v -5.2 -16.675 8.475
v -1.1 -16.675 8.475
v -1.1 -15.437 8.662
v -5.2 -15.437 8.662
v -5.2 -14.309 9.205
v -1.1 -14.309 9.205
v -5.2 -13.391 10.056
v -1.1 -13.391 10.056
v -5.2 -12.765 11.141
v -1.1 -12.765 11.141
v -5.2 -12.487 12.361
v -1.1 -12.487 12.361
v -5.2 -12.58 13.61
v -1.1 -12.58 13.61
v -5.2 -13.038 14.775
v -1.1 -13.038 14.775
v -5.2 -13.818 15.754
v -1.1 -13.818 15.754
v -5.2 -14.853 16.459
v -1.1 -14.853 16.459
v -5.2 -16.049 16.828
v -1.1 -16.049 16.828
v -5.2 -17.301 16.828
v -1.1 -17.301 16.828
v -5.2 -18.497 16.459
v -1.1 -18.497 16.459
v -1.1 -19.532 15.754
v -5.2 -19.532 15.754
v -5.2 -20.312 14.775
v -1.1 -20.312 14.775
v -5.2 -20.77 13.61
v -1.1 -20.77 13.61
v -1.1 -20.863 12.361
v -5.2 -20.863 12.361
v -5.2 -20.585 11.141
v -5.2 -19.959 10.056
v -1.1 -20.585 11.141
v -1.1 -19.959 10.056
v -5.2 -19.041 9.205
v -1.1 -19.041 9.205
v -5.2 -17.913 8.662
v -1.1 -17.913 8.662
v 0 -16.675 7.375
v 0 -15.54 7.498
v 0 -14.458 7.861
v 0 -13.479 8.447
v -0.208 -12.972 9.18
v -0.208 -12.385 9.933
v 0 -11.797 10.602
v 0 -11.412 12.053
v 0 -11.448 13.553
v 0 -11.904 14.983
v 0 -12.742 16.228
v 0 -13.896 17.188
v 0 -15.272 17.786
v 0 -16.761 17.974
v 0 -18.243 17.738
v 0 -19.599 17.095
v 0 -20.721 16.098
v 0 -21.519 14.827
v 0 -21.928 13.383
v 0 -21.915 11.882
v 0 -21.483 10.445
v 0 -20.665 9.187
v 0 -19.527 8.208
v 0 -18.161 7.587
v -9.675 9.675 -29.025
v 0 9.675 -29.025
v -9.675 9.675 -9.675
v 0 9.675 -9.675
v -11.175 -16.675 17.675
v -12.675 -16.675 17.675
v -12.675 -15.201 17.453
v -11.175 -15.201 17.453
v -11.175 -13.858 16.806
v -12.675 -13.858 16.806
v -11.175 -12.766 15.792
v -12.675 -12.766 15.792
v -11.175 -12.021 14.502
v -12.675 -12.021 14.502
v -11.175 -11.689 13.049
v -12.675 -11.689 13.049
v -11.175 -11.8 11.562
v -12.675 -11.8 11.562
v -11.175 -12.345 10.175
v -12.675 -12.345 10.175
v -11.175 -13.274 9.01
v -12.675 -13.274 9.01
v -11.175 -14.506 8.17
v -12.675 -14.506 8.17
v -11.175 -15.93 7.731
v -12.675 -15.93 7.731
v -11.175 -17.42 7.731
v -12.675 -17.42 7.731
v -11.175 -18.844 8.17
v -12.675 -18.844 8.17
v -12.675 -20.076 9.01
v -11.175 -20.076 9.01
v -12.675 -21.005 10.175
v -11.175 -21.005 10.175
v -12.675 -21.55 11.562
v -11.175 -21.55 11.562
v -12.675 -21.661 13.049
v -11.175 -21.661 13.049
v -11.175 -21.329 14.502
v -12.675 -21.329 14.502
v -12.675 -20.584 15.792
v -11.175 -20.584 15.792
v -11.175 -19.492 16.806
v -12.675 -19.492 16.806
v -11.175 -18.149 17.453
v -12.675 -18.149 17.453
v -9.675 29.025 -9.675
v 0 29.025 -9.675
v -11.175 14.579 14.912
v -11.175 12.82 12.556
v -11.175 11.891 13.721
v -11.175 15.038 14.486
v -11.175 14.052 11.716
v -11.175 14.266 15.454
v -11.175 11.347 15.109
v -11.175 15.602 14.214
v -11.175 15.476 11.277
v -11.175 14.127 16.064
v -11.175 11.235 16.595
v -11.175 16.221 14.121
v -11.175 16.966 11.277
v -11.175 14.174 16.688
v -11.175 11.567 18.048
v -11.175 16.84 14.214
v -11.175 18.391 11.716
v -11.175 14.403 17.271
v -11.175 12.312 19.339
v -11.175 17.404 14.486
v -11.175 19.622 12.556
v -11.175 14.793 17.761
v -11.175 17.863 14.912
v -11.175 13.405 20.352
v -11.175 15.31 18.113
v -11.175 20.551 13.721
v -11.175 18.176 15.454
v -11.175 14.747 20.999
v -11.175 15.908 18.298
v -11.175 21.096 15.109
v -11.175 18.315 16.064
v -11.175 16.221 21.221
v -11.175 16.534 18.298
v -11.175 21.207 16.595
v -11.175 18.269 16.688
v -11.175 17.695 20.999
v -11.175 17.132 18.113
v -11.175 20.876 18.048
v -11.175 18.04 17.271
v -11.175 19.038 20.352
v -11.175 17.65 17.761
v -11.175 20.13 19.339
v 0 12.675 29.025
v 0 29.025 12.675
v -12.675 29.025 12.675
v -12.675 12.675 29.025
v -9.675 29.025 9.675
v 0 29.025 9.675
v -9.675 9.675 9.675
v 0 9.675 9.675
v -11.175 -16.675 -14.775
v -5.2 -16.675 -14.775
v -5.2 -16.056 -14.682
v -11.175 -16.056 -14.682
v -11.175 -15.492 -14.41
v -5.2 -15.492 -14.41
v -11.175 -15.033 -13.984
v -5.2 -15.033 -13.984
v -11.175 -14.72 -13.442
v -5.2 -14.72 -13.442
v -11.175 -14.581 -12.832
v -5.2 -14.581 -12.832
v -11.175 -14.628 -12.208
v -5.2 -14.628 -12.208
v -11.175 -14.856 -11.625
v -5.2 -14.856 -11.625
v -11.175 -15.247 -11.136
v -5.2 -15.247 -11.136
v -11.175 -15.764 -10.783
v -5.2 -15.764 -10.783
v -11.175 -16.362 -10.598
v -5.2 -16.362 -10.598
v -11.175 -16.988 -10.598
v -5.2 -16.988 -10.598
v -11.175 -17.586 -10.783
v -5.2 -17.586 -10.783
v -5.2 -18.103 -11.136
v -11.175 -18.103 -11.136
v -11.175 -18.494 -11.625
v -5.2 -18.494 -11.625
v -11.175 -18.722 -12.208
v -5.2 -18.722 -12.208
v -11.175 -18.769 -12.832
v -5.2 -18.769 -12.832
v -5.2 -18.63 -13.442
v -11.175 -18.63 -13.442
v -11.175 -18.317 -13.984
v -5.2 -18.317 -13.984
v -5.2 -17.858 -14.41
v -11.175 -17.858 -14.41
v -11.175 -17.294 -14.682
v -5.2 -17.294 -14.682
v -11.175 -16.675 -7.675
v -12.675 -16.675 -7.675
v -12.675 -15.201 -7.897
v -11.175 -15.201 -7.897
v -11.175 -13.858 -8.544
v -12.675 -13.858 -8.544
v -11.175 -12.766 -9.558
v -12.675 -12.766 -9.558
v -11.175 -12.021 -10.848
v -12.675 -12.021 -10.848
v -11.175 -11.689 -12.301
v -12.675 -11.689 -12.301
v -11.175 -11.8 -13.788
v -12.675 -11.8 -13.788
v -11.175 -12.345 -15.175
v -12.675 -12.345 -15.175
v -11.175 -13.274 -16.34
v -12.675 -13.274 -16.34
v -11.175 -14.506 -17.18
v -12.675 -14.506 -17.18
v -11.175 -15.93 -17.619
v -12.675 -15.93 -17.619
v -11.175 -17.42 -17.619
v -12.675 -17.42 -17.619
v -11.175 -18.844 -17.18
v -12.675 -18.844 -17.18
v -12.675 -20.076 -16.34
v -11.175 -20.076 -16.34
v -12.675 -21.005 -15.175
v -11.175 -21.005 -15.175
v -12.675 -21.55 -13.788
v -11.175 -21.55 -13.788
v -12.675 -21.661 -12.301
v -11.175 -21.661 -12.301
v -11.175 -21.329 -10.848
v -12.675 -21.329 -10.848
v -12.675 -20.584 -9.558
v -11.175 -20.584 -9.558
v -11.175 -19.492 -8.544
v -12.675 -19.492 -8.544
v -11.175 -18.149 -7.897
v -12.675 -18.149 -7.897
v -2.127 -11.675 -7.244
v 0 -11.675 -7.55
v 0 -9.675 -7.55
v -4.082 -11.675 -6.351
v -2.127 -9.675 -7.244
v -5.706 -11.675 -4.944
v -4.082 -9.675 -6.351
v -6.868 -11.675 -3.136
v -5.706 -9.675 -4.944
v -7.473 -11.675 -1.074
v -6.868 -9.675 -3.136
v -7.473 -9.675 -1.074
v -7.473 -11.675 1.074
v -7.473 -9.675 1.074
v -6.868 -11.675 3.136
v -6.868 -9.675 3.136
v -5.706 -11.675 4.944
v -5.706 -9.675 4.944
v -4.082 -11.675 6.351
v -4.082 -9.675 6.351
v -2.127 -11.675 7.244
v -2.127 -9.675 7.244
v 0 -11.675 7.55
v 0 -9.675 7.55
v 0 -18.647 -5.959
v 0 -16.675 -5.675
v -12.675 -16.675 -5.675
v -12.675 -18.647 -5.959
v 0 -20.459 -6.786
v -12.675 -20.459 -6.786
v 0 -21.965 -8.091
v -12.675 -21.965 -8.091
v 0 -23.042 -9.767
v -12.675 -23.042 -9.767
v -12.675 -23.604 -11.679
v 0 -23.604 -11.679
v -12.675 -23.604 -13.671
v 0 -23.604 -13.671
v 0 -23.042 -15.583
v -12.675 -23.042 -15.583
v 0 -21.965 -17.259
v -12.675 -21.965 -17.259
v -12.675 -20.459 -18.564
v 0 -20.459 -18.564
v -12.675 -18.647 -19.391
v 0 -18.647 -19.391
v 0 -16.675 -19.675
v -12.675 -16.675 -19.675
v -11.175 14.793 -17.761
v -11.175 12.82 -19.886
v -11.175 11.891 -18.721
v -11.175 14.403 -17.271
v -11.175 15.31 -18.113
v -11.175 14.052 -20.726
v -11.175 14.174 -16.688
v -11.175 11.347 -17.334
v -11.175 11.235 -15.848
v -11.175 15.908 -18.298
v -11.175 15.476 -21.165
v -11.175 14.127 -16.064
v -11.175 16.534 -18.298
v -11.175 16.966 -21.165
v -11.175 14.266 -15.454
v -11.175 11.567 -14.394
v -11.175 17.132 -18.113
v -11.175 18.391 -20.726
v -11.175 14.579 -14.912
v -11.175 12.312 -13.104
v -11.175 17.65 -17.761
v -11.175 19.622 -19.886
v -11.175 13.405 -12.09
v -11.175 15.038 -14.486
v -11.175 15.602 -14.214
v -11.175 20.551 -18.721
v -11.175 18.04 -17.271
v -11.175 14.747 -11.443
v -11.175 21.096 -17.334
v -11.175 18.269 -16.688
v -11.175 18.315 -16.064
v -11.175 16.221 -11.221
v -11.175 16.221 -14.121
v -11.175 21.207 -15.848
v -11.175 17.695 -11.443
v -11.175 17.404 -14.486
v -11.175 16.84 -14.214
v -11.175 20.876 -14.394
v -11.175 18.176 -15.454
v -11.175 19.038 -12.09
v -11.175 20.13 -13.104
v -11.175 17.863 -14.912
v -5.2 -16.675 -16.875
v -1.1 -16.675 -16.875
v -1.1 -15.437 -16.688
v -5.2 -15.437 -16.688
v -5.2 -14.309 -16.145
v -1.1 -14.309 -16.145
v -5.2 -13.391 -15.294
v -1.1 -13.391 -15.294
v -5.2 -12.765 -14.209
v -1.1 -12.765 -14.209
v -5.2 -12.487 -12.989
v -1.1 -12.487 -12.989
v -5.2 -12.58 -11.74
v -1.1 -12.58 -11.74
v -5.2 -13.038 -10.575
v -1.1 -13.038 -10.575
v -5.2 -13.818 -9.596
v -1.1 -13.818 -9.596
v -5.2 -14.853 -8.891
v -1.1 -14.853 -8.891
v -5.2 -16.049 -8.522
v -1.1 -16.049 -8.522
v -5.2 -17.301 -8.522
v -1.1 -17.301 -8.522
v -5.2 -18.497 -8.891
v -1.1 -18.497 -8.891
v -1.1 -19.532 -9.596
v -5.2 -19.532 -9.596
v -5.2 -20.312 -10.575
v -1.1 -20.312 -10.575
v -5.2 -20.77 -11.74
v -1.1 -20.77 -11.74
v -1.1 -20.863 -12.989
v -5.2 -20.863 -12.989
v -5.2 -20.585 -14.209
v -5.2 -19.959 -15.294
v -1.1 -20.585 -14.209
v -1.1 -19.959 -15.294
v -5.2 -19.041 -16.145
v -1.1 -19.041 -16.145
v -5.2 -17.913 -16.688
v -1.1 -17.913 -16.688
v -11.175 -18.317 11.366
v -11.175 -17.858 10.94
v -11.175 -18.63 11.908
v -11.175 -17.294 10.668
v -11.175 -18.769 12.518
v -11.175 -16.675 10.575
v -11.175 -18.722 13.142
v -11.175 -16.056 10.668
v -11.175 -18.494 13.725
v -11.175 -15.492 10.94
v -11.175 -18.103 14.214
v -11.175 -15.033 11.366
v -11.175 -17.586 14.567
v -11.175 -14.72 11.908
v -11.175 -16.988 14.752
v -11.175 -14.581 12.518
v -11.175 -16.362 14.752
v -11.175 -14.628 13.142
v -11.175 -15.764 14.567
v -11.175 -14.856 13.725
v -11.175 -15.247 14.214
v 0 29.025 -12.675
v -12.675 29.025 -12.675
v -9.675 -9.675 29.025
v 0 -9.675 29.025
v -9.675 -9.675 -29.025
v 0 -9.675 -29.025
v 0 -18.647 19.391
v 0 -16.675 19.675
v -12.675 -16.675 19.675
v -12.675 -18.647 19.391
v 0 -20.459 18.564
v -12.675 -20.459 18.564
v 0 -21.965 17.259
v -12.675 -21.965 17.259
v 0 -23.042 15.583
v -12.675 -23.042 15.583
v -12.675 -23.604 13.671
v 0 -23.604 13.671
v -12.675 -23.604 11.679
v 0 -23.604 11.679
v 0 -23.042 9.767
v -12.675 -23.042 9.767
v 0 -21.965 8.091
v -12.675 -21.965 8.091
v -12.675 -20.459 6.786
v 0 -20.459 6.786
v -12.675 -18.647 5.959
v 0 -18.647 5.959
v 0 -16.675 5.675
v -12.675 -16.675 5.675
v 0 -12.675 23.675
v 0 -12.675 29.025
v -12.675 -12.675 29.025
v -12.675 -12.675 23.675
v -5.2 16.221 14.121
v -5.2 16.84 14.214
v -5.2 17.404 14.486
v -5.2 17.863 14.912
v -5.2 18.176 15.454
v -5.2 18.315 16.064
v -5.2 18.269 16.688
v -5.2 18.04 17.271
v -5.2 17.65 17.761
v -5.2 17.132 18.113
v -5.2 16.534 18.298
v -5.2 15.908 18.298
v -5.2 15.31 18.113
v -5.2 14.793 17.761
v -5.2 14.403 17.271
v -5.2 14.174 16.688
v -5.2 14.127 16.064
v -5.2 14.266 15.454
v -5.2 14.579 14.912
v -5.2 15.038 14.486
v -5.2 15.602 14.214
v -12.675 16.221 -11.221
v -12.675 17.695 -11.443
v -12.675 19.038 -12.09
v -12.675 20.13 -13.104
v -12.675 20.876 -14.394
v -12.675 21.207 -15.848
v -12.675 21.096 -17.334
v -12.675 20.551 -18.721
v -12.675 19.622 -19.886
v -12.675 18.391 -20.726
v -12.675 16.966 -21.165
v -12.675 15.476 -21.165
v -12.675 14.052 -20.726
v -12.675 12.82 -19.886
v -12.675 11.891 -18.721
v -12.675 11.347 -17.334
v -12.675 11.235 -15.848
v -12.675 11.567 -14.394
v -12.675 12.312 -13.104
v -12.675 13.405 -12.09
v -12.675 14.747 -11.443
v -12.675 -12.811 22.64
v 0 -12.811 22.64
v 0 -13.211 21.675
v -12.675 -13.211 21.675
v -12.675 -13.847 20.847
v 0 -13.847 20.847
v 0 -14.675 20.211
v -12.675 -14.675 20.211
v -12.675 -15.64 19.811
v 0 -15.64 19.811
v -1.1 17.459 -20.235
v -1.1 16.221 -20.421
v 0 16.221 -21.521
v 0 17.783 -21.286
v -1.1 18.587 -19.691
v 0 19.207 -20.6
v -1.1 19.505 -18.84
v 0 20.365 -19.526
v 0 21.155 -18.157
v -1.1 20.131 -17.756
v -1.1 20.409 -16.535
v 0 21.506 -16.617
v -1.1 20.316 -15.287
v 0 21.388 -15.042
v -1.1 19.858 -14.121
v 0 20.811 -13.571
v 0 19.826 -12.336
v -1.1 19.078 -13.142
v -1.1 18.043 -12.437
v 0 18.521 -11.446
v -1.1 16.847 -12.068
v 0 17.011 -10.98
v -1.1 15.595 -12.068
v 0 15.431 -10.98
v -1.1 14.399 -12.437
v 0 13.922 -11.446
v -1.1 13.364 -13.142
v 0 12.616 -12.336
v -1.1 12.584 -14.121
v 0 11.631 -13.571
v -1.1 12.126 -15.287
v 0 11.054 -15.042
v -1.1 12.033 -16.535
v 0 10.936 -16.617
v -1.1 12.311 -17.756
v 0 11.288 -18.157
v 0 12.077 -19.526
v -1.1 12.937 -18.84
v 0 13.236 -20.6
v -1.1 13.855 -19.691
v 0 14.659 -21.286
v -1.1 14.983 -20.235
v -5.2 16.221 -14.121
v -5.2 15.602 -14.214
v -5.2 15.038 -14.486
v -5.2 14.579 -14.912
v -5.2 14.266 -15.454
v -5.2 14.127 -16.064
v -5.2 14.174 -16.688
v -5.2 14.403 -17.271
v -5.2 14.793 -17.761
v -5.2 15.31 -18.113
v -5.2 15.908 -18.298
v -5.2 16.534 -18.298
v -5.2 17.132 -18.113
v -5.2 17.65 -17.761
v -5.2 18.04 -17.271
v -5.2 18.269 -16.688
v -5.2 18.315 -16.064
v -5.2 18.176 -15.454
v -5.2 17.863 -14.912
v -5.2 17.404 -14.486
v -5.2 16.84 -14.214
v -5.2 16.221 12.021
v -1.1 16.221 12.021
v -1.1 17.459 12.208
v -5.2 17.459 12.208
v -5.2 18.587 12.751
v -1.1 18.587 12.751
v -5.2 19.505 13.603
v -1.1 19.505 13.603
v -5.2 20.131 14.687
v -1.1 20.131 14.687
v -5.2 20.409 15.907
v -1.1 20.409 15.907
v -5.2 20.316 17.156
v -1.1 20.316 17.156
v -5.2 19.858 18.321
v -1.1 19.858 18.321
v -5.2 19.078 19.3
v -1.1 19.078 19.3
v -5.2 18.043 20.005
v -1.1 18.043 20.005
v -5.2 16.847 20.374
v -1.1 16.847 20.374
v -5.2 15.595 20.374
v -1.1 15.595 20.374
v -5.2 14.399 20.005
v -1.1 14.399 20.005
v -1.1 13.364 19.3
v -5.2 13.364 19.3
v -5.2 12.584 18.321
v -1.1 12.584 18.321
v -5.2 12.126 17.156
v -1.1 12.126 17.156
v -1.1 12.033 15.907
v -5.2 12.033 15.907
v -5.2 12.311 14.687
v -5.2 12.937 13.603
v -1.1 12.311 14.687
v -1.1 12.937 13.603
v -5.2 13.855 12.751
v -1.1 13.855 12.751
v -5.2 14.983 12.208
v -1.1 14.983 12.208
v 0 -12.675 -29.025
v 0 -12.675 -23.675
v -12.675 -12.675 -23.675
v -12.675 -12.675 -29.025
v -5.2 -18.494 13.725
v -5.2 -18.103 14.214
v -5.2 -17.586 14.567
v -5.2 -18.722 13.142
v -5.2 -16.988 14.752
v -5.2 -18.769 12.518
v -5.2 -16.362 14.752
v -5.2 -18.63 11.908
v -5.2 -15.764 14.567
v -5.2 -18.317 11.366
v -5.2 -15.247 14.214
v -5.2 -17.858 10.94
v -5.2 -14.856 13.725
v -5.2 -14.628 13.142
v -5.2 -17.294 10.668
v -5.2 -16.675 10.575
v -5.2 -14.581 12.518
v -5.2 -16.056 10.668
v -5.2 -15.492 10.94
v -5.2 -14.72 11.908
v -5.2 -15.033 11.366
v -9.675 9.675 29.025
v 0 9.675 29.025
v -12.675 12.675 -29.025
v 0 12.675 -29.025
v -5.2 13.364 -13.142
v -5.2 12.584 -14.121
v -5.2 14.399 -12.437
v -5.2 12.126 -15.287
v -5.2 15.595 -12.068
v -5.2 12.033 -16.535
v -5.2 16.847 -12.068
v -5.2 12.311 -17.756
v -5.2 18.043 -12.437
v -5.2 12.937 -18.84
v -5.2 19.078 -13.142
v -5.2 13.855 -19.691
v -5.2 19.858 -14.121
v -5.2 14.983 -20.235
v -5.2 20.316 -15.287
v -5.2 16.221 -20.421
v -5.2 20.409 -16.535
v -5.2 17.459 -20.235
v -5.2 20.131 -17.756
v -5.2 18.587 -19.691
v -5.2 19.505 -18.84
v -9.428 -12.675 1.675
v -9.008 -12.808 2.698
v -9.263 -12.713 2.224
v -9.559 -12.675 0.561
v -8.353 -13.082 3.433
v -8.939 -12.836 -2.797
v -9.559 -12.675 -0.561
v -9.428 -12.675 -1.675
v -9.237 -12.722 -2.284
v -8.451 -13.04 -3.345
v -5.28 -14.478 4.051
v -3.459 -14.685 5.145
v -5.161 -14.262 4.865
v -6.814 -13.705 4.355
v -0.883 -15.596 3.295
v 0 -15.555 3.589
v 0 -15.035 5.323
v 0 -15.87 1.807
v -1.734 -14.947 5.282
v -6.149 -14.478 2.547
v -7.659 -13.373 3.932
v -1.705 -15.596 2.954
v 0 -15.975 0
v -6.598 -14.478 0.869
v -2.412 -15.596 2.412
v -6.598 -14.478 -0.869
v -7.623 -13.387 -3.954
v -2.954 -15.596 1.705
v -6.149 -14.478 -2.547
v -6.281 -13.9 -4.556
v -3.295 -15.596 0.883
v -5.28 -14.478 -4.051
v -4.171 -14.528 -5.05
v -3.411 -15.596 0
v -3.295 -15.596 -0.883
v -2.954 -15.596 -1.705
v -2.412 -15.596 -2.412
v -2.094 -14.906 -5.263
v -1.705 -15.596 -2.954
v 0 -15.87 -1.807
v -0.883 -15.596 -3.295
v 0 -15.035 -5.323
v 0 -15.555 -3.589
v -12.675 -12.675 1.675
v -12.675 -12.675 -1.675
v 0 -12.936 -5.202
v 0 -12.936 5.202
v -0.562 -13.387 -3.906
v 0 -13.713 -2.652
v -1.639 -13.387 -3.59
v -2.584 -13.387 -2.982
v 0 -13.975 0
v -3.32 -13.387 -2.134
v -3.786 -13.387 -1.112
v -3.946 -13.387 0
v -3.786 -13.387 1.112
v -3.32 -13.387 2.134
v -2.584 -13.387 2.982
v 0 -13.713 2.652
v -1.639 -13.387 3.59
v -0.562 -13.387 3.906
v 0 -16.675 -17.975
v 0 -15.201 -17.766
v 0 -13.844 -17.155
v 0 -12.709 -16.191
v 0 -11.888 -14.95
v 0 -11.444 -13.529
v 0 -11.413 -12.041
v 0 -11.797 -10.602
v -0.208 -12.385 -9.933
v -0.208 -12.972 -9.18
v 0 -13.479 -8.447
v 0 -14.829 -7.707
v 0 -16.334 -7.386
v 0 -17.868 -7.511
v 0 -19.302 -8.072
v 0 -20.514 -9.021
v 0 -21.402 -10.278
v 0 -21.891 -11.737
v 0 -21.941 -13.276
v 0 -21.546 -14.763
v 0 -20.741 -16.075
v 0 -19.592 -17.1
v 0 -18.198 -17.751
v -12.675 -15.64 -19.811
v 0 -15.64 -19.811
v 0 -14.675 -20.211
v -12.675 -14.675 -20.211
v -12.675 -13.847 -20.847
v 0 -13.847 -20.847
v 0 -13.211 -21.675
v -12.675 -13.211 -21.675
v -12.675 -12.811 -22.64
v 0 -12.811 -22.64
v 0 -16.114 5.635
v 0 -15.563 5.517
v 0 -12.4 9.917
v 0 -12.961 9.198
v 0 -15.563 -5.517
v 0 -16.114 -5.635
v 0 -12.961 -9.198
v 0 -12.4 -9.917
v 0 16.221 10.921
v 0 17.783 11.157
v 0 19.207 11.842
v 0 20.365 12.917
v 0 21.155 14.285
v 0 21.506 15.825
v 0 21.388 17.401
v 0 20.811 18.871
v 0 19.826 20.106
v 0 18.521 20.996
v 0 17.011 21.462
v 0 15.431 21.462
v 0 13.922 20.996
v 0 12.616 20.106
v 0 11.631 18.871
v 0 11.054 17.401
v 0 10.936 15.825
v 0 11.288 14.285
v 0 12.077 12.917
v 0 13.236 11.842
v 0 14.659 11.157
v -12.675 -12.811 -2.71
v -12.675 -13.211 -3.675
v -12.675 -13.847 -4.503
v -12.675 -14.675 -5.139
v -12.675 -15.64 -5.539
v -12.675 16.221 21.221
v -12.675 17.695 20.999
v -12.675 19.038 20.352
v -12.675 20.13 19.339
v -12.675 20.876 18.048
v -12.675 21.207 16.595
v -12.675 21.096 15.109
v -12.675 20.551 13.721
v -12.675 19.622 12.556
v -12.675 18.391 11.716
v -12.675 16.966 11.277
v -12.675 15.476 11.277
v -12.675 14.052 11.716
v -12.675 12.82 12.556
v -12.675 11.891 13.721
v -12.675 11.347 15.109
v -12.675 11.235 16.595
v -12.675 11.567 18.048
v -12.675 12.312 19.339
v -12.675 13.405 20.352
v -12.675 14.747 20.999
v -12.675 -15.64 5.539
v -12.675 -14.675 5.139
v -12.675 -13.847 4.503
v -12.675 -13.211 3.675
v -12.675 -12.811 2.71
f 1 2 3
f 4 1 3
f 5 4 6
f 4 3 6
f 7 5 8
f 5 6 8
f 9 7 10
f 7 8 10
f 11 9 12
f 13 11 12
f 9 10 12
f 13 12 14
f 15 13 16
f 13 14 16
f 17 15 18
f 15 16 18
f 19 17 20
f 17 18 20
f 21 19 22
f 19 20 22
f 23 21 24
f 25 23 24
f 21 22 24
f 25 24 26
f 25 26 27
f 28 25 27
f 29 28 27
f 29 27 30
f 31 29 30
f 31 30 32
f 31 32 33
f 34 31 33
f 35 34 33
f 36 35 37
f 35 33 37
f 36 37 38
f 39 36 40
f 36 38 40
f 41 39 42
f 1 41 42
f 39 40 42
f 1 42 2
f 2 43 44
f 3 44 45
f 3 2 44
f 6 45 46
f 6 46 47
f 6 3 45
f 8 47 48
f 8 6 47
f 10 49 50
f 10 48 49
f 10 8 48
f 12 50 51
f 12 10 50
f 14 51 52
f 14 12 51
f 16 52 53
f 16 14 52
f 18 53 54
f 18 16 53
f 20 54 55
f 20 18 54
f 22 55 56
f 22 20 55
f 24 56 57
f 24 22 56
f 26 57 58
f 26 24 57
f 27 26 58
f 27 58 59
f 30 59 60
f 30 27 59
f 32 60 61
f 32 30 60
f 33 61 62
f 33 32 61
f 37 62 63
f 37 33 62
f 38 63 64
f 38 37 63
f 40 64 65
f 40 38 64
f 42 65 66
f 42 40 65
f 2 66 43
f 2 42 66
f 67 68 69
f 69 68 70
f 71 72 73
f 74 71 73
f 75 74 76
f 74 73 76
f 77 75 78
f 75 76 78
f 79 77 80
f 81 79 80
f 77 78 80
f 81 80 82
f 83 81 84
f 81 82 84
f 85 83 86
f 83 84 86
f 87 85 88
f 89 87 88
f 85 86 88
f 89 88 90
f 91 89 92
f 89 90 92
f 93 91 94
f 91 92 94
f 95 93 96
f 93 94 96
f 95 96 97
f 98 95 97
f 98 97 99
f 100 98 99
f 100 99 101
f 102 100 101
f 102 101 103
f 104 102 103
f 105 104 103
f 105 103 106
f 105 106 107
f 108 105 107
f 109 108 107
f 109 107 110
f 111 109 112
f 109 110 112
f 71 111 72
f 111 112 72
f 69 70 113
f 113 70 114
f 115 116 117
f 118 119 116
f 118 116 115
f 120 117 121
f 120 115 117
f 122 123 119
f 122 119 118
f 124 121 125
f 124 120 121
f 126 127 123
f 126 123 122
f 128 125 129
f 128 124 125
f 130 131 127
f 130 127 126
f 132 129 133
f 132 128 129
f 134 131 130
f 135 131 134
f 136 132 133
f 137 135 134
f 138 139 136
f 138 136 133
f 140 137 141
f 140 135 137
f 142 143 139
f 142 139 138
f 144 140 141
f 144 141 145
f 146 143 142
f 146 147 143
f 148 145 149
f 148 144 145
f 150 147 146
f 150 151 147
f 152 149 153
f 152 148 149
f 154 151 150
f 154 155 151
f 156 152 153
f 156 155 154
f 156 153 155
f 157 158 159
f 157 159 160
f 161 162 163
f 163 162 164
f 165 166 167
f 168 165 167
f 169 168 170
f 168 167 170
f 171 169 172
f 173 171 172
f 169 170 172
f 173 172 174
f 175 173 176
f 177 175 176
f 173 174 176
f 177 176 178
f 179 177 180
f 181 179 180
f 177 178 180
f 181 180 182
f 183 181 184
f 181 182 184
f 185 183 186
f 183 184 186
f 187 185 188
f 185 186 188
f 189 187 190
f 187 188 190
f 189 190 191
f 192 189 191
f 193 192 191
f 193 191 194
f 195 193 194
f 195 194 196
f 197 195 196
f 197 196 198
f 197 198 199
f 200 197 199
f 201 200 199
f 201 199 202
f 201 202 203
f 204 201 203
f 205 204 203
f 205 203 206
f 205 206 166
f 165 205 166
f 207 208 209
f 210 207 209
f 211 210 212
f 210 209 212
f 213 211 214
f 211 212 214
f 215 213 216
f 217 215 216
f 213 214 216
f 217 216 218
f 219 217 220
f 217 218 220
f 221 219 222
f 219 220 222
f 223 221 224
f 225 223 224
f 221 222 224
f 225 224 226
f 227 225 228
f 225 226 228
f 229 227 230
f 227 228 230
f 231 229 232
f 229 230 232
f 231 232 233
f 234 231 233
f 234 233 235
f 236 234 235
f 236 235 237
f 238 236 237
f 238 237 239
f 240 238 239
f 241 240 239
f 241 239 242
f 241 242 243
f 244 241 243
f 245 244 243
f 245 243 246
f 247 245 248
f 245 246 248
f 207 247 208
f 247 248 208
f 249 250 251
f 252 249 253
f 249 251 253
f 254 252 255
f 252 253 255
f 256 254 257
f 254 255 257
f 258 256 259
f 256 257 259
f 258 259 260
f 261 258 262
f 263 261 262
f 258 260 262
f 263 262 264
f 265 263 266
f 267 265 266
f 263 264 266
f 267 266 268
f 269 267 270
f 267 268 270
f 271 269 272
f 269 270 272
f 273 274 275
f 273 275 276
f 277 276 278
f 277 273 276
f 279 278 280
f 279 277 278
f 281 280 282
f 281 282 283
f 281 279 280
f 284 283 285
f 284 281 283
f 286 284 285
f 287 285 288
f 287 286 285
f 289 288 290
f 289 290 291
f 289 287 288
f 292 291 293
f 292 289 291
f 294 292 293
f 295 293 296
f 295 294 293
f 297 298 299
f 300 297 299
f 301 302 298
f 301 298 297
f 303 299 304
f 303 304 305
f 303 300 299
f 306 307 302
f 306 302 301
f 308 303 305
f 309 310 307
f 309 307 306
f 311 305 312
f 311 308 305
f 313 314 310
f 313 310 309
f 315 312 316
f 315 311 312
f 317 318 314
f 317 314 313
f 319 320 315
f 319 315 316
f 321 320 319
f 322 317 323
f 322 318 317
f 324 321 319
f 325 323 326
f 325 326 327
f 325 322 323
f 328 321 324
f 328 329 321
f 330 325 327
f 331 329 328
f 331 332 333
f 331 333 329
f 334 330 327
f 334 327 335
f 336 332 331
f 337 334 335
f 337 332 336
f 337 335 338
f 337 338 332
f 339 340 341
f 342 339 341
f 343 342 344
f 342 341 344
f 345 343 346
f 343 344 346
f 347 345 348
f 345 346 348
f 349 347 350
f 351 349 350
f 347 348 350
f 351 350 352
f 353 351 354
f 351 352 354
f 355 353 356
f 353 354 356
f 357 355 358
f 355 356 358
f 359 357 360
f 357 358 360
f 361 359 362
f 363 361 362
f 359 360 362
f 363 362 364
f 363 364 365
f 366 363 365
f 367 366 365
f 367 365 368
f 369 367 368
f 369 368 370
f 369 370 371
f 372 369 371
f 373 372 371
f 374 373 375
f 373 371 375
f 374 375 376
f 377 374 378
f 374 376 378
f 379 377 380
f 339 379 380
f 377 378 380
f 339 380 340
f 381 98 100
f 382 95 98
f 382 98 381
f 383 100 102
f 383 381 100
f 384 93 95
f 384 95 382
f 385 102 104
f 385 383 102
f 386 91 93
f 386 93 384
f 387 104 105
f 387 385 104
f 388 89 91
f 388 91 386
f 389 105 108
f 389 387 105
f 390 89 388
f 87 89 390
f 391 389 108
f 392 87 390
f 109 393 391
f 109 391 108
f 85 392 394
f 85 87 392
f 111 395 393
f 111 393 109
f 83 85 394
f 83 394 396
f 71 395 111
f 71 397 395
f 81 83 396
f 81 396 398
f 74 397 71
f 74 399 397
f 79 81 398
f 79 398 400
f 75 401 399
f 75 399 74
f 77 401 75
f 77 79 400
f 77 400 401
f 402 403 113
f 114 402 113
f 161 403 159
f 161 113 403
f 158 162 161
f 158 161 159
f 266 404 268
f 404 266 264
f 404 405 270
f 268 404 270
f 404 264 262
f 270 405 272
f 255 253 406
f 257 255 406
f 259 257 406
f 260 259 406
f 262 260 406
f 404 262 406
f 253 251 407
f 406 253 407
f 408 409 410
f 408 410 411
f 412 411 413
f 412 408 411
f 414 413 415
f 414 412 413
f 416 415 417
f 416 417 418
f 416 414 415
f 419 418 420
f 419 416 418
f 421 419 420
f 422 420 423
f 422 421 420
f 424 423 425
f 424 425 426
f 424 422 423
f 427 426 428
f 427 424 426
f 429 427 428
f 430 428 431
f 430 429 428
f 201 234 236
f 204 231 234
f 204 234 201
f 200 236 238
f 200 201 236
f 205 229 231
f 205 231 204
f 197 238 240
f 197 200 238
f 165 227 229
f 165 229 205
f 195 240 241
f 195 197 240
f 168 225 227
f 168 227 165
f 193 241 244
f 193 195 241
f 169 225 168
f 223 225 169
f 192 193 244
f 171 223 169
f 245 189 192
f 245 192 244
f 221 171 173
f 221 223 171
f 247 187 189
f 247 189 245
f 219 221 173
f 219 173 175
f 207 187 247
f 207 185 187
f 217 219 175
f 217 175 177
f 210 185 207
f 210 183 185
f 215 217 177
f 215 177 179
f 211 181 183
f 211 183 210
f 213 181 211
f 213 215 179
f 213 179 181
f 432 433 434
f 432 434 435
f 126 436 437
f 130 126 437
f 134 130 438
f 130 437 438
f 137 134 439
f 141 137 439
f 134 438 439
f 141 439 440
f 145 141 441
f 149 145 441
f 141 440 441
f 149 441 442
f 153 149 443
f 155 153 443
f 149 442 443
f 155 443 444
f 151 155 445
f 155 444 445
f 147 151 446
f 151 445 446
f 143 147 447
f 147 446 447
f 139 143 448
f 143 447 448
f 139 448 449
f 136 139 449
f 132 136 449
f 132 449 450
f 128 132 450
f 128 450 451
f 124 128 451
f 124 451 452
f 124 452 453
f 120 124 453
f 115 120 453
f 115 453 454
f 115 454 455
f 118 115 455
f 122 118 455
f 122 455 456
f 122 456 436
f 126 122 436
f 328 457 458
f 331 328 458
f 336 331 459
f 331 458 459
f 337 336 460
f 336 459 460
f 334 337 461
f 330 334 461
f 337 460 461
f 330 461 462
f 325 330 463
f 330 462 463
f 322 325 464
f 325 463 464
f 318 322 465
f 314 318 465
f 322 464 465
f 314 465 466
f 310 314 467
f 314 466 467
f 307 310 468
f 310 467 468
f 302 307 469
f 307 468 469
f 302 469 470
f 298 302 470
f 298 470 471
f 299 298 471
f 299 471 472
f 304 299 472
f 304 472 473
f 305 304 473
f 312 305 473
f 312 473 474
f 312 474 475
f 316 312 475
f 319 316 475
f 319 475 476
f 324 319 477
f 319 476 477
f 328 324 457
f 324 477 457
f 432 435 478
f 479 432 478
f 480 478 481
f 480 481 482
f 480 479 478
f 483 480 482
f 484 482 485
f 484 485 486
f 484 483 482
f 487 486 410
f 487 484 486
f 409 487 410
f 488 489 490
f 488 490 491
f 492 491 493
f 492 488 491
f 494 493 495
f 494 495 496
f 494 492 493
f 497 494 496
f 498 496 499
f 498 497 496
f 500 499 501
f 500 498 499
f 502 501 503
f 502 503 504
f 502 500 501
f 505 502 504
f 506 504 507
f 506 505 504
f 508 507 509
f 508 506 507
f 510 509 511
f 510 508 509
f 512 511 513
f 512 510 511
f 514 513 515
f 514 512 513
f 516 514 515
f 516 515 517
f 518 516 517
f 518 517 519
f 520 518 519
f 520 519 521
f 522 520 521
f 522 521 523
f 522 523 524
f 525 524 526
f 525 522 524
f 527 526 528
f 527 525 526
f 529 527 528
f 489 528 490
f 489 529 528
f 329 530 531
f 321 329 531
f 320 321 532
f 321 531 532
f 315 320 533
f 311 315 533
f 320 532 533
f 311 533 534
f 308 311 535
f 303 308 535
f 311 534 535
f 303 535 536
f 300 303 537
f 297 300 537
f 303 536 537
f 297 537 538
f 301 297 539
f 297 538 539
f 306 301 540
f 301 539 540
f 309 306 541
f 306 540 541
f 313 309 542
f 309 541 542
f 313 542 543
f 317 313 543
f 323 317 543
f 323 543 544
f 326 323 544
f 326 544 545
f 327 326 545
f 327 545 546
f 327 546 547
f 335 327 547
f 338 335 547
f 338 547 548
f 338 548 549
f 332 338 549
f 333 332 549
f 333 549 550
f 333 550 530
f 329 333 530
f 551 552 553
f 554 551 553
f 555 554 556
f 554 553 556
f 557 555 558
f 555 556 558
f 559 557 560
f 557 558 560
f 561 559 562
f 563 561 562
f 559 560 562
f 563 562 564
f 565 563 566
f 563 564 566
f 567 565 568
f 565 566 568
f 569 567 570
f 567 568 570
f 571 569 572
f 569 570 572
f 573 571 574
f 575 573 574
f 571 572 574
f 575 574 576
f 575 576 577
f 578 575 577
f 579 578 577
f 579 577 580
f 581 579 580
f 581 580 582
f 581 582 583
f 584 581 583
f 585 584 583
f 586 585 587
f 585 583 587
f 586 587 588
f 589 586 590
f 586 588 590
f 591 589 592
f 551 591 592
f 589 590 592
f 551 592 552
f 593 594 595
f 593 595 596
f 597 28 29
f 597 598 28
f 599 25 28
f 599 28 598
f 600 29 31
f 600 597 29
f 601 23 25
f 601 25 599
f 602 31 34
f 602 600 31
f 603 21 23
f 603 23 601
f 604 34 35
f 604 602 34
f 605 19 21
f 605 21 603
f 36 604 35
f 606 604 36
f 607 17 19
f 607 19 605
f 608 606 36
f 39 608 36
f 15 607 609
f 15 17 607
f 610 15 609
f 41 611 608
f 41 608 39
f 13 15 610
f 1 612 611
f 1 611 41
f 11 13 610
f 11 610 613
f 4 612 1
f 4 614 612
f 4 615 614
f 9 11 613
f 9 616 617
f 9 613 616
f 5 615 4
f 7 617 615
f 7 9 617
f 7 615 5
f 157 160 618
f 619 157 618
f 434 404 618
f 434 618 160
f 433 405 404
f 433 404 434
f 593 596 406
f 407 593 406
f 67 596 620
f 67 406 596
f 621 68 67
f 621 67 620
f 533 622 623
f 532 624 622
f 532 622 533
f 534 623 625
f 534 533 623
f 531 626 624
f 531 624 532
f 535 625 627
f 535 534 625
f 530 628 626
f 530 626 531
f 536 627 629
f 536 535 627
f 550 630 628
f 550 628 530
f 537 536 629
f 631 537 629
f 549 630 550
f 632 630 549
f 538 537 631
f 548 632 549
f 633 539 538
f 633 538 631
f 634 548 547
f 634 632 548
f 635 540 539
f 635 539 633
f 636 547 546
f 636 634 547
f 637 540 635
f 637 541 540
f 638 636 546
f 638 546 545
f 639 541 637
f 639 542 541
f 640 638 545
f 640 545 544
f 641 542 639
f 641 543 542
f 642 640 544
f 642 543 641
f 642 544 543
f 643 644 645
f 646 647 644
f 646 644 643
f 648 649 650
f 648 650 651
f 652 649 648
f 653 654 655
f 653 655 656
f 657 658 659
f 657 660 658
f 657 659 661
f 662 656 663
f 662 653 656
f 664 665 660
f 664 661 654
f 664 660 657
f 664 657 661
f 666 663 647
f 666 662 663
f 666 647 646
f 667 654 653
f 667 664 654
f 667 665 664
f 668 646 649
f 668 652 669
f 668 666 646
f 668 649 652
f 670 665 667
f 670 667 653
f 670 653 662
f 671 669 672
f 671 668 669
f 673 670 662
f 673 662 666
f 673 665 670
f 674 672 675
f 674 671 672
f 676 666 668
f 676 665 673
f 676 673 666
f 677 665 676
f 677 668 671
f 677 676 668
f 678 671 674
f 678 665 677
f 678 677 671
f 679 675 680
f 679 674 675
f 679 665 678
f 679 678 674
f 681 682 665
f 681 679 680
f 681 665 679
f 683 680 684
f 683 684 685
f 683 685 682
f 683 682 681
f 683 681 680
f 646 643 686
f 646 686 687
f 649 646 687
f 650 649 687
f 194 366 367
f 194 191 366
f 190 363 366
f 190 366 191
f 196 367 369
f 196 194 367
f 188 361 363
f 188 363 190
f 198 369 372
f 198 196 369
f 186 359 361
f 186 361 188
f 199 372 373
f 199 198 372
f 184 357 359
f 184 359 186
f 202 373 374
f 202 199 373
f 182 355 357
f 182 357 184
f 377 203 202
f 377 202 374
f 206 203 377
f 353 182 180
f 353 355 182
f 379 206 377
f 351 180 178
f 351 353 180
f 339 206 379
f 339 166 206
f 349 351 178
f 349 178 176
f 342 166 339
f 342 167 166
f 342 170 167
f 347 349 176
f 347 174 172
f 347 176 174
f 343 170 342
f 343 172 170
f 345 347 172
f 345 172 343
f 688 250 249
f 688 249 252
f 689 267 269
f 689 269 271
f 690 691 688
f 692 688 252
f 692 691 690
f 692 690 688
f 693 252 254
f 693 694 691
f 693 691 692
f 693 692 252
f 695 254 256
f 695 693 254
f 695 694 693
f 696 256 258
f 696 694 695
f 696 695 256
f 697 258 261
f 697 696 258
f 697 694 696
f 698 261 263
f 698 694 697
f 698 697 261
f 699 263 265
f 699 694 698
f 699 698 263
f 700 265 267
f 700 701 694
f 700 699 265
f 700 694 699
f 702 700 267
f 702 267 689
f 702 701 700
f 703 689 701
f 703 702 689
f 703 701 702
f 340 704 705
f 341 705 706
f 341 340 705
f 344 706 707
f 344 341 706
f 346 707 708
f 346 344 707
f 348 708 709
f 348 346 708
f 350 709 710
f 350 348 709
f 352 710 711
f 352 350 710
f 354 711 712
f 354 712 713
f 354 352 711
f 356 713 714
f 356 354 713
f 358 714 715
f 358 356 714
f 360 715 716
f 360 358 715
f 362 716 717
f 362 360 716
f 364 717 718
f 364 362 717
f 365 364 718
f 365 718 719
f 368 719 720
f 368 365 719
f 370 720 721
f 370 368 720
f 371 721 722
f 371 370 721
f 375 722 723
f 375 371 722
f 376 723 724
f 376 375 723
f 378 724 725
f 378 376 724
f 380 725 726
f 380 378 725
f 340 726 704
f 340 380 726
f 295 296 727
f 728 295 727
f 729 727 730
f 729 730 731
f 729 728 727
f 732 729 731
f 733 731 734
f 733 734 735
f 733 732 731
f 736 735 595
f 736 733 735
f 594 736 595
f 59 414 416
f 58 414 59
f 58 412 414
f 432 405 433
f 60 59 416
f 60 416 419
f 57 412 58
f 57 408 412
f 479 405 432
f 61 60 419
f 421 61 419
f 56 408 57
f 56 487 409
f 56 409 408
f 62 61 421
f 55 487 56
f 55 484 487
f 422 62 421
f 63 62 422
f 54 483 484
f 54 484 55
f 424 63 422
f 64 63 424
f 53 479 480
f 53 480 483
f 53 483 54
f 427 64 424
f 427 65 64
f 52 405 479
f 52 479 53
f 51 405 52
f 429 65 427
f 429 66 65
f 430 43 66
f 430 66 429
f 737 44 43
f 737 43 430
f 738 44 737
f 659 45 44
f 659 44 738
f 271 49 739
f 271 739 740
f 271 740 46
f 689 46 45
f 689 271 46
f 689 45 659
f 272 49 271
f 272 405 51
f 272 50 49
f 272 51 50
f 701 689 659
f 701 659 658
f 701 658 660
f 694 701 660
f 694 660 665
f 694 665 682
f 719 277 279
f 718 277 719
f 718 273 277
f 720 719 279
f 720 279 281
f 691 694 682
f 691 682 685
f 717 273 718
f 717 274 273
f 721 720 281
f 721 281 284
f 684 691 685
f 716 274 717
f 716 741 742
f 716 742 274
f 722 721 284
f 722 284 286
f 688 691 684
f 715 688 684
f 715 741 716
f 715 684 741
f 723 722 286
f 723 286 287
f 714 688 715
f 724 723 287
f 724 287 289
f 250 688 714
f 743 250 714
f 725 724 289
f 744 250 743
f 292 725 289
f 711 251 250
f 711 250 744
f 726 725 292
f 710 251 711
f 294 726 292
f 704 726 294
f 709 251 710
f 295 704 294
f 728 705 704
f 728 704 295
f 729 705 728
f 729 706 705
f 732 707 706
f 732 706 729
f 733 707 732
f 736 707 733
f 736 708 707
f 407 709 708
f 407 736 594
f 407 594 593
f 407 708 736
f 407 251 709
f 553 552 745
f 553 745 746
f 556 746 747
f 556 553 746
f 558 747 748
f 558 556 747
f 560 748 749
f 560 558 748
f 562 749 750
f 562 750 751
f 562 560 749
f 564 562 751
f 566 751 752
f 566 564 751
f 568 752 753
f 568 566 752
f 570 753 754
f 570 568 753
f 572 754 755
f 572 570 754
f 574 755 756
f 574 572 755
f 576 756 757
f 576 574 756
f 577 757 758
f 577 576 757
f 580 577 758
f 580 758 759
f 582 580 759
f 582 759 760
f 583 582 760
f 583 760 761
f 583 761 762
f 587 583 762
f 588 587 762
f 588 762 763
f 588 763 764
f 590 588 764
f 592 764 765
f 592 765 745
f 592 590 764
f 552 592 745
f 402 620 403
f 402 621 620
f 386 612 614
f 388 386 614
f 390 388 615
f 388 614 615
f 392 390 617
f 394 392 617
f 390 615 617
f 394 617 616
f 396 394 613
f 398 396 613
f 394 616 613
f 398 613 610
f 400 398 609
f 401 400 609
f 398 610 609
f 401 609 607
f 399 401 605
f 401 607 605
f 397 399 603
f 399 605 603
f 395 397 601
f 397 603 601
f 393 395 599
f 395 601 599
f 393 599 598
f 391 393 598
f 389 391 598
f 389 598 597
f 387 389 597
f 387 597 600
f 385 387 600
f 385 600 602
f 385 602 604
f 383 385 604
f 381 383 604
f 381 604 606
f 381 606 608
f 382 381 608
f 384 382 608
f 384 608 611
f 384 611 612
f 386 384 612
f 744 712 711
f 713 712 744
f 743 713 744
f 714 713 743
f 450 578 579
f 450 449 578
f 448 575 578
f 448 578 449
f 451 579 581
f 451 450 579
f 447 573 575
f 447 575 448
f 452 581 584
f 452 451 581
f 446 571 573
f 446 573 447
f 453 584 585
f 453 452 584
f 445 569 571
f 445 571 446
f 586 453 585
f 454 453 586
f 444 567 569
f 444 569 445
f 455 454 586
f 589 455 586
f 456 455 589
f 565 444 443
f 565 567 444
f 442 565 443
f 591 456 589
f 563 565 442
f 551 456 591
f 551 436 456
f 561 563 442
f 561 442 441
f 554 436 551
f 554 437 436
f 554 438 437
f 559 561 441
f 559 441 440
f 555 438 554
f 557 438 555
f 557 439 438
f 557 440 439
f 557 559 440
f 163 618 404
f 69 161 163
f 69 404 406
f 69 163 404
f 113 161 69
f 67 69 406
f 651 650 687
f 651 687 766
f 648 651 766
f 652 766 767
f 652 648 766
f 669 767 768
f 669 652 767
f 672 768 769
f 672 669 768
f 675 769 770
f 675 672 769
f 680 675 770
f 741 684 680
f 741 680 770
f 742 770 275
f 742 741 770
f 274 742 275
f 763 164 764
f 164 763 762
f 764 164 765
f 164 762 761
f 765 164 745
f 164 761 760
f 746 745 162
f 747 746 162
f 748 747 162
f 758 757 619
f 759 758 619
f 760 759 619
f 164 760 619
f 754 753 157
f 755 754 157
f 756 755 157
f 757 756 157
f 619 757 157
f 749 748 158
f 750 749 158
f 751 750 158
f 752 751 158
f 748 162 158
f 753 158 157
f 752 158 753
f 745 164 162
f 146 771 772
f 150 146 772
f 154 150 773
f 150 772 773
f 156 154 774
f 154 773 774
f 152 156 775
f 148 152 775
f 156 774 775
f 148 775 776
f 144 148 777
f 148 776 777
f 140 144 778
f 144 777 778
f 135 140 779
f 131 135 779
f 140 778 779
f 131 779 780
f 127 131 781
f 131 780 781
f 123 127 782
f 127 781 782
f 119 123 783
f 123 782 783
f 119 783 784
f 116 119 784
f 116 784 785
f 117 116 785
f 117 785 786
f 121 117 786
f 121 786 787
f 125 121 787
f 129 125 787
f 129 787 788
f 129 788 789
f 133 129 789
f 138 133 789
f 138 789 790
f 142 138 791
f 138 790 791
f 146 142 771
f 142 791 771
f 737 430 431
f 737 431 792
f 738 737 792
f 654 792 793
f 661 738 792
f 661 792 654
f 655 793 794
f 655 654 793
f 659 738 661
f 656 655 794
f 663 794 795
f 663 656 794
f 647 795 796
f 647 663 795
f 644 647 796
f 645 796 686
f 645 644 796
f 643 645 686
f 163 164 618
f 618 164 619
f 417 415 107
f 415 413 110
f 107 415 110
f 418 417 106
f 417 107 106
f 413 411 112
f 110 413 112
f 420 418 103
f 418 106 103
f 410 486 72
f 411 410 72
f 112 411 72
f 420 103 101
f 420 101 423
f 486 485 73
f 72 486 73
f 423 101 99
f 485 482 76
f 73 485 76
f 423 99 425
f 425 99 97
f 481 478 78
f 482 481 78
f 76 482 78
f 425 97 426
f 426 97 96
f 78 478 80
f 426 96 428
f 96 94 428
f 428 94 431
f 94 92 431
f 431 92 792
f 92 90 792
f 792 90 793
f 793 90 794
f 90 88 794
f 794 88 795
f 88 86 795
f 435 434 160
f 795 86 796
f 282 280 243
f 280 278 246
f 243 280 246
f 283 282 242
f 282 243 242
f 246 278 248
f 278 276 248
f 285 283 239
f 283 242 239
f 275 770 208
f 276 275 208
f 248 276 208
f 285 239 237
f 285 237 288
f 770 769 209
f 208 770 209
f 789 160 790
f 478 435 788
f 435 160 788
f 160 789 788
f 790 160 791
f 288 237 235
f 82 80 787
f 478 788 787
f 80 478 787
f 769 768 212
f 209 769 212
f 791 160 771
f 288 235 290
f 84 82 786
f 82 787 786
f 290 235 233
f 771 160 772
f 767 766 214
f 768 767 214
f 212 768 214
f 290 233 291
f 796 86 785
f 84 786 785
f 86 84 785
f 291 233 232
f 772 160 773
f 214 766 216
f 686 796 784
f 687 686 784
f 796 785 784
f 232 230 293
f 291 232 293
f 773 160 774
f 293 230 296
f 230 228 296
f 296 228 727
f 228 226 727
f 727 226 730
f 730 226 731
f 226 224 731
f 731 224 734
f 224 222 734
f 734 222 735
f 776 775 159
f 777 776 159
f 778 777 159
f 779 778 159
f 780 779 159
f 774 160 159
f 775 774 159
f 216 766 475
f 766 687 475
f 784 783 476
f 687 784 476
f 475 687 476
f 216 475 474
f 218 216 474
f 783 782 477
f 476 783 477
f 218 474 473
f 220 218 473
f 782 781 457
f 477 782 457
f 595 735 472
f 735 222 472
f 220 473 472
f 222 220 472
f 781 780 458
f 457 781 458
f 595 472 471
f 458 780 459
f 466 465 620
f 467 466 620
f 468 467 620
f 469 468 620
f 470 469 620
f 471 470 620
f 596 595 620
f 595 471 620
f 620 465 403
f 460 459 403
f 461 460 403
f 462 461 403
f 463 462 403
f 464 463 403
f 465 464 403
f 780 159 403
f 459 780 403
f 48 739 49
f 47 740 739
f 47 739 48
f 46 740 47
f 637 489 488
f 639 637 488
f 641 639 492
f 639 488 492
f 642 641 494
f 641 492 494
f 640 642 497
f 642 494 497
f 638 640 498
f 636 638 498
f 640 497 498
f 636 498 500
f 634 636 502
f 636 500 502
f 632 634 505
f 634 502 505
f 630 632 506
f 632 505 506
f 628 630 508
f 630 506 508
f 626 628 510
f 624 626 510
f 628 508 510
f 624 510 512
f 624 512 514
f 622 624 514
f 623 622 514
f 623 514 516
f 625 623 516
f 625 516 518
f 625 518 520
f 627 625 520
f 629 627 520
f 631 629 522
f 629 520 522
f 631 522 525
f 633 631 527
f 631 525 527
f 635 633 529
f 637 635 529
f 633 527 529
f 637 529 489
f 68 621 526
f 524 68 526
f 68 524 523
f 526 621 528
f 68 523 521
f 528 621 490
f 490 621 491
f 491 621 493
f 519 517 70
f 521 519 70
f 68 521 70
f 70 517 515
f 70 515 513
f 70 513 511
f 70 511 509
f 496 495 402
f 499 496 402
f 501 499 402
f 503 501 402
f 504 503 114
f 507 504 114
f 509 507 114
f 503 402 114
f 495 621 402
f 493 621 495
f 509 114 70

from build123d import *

# Parameters (mm, degrees)
BOSS_EXTRUDE1_DEPTH   = 9.675
SKETCH2_W             = 58.05
SKETCH2_H             = 3
BOSS_EXTRUDE1_2_DEPTH = 9.675
BOSS_EXTRUDE1_3_DEPTH = 9.675
BOSS_EXTRUDE2_DEPTH   = 3
BOSS_EXTRUDE3_DEPTH   = 12.675
SKETCH6_R             = 2.1
CUT_EXTRUDE1_DEPTH    = 43.959945007
SKETCH7_R             = 5
CUT_EXTRUDE2_DEPTH    = 1.5
SKETCH8_R             = 4.2
CUT_EXTRUDE3_DEPTH    = 5.2
CHAMFER1_SIZE         = 1.1
SKETCH9_R             = 7.55
CUT_EXTRUDE4_DEPTH    = 2
REVOLVE1_ANGLE        = 180


with BuildPart() as part:
    # Sketch2 → Boss-Extrude1 (new body)
    with BuildSketch(Plane(origin=(0, 0, 0), x_dir=(0, 0, -1), z_dir=(1, 0, 0))):
        Polygon((-29.025, 9.675), (-29.025, 12.675), (-12.675, 29.025), (-9.675, 29.025), (-9.675, 9.675), align=None)
    extrude(amount=-BOSS_EXTRUDE1_DEPTH)



with BuildPart() as body_2:
    # Sketch2 → Boss-Extrude1 2 (new body)
    with BuildSketch(Plane(origin=(0, 0, 0), x_dir=(0, 0, -1), z_dir=(1, 0, 0))):
        with Locations((0, -11.175)):
            Rectangle(SKETCH2_W, SKETCH2_H)
    extrude(amount=-BOSS_EXTRUDE1_2_DEPTH)


with BuildPart() as body_3:
    # Sketch2 → Boss-Extrude1 3 (new body)
    with BuildSketch(Plane(origin=(0, 0, 0), x_dir=(0, 0, -1), z_dir=(1, 0, 0))):
        Polygon((9.675, 29.025), (12.675, 29.025), (29.025, 12.675), (29.025, 9.675), (9.675, 9.675), align=None)
    extrude(amount=-BOSS_EXTRUDE1_3_DEPTH)


with BuildPart() as part_1:
    add(part.part)

    add(body_2.part)  # Boss-Extrude2 merges body 2

    add(body_3.part)  # Boss-Extrude2 merges body 3
    # Sketch3 → Boss-Extrude2 (add)
    with BuildSketch(Plane.ZY.offset(9.675)):
        Polygon((-29.025, 12.675), (-12.675, 29.025), (12.675, 29.025), (29.025, 12.675), (29.025, -12.675), (-29.025, -12.675), align=None)
    extrude(amount=BOSS_EXTRUDE2_DEPTH)

    # Sketch5 → Boss-Extrude3 (add)
    with BuildSketch(Plane(origin=(0, 0, 0), x_dir=(0, 0, -1), z_dir=(1, 0, 0))):
        with BuildLine():
            Line((-29.025, -12.675), (-23.675, -12.675))
            ThreePointArc((-23.675, -12.675), (-20.846572875, -13.846572875), (-19.675, -16.675))
            ThreePointArc((-19.675, -16.675), (-12.675, -23.675), (-5.675, -16.675))
            ThreePointArc((-5.675, -16.675), (-4.503427125, -13.846572875), (-1.675, -12.675))
            Line((-1.675, -12.675), (1.675, -12.675))
            ThreePointArc((1.675, -12.675), (4.503427125, -13.846572875), (5.675, -16.675))
            ThreePointArc((5.675, -16.675), (12.675, -23.675), (19.675, -16.675))
            ThreePointArc((19.675, -16.675), (20.846572875, -13.846572875), (23.675, -12.675))
            Line((23.675, -12.675), (29.025, -12.675))
            Line((29.025, -12.675), (29.025, -9.675))
            Line((29.025, -9.675), (-29.025, -9.675))
            Line((-29.025, -9.675), (-29.025, -12.675))
        make_face()
    extrude(amount=-BOSS_EXTRUDE3_DEPTH)

    # Sketch6 → Cut-Extrude1 (cut, through all)
    with BuildSketch(Plane(origin=(0, 0, 0), x_dir=(0, 0, -1), z_dir=(1, 0, 0))):
        with Locations((-12.675, -16.675)):
            Circle(SKETCH6_R)
        with Locations((12.675, -16.675)):
            Circle(SKETCH6_R)
        with Locations((-16.22116344, 16.22116344)):
            Circle(SKETCH6_R)
        with Locations(Location((16.22116344, 16.22116344, 0), (0, 0, 180))):
            Circle(SKETCH6_R)
    extrude(amount=-CUT_EXTRUDE1_DEPTH, mode=Mode.SUBTRACT)

    # Sketch7 → Cut-Extrude2 (cut)
    with BuildSketch(Plane.ZY.offset(12.675)):
        with Locations((-16.22116344, 16.22116344)):
            Circle(SKETCH7_R)
        with Locations((16.22116344, 16.22116344)):
            Circle(SKETCH7_R)
        with Locations((-12.675, -16.675)):
            Circle(SKETCH7_R)
        with Locations((12.675, -16.675)):
            Circle(SKETCH7_R)
    extrude(amount=-CUT_EXTRUDE2_DEPTH, mode=Mode.SUBTRACT)

    # Sketch8 → Cut-Extrude3 (cut)
    with BuildSketch(Plane(origin=(0, 0, 0), x_dir=(0, 0, -1), z_dir=(1, 0, 0))):
        with Locations((-16.22116344, 16.22116344)):
            Circle(SKETCH8_R)
        with Locations((16.22116344, 16.22116344)):
            Circle(SKETCH8_R)
        with Locations((12.675, -16.675)):
            Circle(SKETCH8_R)
        with Locations((-12.675, -16.675)):
            Circle(SKETCH8_R)
    extrude(amount=-CUT_EXTRUDE3_DEPTH, mode=Mode.SUBTRACT)

    # Chamfer1
    chamfer1_edges = [part_1.edges().sort_by_distance(p)[0] for p in [
        (0, -16.675, 16.875),
        (0, -16.675, -8.475),
        (0, 16.22116344, -12.02116344),
        (0, 16.22116344, 20.42116344),
    ]]
    chamfer(chamfer1_edges, length=CHAMFER1_SIZE)

    # Sketch9 → Cut-Extrude4 (cut)
    with BuildSketch(Plane(origin=(0, -9.675, 0), x_dir=(1, 0, 0), z_dir=(0, 1, 0))):
        Circle(SKETCH9_R)
    extrude(amount=-CUT_EXTRUDE4_DEPTH, mode=Mode.SUBTRACT)

    # Sketch10 → Revolve1 (revolve)
    with BuildSketch(Plane(origin=(0, 0, 0), x_dir=(0, 0, -1), z_dir=(1, 0, 0))):
        with BuildLine():
            Line((0, -15.975), (0, -11.675))
            Line((0, -11.675), (-10.731723594, -11.675))
            ThreePointArc((-10.731723594, -11.675), (-5.780568556, -14.860004257), (0, -15.975))
        make_face()
    revolve(axis=Axis((0, -15.975, 0), (0, -1, 0)), revolution_arc=REVOLVE1_ANGLE)

    # Sketch11 → Cut-Revolve1 (revolve, cut)
    with BuildSketch(Plane(origin=(0, 0, 0), x_dir=(0, 0, -1), z_dir=(1, 0, 0))):
        with BuildLine():
            Line((0, -13.975), (0, -11.675))
            Line((0, -11.675), (-7.55, -11.675))
            ThreePointArc((-7.55, -11.675), (-3.946279894, -13.387244869), (0, -13.975))
        make_face()
    revolve(axis=Axis((0, -13.975, 0), (0, 1, 0)), mode=Mode.SUBTRACT)


solid = part_1.part
